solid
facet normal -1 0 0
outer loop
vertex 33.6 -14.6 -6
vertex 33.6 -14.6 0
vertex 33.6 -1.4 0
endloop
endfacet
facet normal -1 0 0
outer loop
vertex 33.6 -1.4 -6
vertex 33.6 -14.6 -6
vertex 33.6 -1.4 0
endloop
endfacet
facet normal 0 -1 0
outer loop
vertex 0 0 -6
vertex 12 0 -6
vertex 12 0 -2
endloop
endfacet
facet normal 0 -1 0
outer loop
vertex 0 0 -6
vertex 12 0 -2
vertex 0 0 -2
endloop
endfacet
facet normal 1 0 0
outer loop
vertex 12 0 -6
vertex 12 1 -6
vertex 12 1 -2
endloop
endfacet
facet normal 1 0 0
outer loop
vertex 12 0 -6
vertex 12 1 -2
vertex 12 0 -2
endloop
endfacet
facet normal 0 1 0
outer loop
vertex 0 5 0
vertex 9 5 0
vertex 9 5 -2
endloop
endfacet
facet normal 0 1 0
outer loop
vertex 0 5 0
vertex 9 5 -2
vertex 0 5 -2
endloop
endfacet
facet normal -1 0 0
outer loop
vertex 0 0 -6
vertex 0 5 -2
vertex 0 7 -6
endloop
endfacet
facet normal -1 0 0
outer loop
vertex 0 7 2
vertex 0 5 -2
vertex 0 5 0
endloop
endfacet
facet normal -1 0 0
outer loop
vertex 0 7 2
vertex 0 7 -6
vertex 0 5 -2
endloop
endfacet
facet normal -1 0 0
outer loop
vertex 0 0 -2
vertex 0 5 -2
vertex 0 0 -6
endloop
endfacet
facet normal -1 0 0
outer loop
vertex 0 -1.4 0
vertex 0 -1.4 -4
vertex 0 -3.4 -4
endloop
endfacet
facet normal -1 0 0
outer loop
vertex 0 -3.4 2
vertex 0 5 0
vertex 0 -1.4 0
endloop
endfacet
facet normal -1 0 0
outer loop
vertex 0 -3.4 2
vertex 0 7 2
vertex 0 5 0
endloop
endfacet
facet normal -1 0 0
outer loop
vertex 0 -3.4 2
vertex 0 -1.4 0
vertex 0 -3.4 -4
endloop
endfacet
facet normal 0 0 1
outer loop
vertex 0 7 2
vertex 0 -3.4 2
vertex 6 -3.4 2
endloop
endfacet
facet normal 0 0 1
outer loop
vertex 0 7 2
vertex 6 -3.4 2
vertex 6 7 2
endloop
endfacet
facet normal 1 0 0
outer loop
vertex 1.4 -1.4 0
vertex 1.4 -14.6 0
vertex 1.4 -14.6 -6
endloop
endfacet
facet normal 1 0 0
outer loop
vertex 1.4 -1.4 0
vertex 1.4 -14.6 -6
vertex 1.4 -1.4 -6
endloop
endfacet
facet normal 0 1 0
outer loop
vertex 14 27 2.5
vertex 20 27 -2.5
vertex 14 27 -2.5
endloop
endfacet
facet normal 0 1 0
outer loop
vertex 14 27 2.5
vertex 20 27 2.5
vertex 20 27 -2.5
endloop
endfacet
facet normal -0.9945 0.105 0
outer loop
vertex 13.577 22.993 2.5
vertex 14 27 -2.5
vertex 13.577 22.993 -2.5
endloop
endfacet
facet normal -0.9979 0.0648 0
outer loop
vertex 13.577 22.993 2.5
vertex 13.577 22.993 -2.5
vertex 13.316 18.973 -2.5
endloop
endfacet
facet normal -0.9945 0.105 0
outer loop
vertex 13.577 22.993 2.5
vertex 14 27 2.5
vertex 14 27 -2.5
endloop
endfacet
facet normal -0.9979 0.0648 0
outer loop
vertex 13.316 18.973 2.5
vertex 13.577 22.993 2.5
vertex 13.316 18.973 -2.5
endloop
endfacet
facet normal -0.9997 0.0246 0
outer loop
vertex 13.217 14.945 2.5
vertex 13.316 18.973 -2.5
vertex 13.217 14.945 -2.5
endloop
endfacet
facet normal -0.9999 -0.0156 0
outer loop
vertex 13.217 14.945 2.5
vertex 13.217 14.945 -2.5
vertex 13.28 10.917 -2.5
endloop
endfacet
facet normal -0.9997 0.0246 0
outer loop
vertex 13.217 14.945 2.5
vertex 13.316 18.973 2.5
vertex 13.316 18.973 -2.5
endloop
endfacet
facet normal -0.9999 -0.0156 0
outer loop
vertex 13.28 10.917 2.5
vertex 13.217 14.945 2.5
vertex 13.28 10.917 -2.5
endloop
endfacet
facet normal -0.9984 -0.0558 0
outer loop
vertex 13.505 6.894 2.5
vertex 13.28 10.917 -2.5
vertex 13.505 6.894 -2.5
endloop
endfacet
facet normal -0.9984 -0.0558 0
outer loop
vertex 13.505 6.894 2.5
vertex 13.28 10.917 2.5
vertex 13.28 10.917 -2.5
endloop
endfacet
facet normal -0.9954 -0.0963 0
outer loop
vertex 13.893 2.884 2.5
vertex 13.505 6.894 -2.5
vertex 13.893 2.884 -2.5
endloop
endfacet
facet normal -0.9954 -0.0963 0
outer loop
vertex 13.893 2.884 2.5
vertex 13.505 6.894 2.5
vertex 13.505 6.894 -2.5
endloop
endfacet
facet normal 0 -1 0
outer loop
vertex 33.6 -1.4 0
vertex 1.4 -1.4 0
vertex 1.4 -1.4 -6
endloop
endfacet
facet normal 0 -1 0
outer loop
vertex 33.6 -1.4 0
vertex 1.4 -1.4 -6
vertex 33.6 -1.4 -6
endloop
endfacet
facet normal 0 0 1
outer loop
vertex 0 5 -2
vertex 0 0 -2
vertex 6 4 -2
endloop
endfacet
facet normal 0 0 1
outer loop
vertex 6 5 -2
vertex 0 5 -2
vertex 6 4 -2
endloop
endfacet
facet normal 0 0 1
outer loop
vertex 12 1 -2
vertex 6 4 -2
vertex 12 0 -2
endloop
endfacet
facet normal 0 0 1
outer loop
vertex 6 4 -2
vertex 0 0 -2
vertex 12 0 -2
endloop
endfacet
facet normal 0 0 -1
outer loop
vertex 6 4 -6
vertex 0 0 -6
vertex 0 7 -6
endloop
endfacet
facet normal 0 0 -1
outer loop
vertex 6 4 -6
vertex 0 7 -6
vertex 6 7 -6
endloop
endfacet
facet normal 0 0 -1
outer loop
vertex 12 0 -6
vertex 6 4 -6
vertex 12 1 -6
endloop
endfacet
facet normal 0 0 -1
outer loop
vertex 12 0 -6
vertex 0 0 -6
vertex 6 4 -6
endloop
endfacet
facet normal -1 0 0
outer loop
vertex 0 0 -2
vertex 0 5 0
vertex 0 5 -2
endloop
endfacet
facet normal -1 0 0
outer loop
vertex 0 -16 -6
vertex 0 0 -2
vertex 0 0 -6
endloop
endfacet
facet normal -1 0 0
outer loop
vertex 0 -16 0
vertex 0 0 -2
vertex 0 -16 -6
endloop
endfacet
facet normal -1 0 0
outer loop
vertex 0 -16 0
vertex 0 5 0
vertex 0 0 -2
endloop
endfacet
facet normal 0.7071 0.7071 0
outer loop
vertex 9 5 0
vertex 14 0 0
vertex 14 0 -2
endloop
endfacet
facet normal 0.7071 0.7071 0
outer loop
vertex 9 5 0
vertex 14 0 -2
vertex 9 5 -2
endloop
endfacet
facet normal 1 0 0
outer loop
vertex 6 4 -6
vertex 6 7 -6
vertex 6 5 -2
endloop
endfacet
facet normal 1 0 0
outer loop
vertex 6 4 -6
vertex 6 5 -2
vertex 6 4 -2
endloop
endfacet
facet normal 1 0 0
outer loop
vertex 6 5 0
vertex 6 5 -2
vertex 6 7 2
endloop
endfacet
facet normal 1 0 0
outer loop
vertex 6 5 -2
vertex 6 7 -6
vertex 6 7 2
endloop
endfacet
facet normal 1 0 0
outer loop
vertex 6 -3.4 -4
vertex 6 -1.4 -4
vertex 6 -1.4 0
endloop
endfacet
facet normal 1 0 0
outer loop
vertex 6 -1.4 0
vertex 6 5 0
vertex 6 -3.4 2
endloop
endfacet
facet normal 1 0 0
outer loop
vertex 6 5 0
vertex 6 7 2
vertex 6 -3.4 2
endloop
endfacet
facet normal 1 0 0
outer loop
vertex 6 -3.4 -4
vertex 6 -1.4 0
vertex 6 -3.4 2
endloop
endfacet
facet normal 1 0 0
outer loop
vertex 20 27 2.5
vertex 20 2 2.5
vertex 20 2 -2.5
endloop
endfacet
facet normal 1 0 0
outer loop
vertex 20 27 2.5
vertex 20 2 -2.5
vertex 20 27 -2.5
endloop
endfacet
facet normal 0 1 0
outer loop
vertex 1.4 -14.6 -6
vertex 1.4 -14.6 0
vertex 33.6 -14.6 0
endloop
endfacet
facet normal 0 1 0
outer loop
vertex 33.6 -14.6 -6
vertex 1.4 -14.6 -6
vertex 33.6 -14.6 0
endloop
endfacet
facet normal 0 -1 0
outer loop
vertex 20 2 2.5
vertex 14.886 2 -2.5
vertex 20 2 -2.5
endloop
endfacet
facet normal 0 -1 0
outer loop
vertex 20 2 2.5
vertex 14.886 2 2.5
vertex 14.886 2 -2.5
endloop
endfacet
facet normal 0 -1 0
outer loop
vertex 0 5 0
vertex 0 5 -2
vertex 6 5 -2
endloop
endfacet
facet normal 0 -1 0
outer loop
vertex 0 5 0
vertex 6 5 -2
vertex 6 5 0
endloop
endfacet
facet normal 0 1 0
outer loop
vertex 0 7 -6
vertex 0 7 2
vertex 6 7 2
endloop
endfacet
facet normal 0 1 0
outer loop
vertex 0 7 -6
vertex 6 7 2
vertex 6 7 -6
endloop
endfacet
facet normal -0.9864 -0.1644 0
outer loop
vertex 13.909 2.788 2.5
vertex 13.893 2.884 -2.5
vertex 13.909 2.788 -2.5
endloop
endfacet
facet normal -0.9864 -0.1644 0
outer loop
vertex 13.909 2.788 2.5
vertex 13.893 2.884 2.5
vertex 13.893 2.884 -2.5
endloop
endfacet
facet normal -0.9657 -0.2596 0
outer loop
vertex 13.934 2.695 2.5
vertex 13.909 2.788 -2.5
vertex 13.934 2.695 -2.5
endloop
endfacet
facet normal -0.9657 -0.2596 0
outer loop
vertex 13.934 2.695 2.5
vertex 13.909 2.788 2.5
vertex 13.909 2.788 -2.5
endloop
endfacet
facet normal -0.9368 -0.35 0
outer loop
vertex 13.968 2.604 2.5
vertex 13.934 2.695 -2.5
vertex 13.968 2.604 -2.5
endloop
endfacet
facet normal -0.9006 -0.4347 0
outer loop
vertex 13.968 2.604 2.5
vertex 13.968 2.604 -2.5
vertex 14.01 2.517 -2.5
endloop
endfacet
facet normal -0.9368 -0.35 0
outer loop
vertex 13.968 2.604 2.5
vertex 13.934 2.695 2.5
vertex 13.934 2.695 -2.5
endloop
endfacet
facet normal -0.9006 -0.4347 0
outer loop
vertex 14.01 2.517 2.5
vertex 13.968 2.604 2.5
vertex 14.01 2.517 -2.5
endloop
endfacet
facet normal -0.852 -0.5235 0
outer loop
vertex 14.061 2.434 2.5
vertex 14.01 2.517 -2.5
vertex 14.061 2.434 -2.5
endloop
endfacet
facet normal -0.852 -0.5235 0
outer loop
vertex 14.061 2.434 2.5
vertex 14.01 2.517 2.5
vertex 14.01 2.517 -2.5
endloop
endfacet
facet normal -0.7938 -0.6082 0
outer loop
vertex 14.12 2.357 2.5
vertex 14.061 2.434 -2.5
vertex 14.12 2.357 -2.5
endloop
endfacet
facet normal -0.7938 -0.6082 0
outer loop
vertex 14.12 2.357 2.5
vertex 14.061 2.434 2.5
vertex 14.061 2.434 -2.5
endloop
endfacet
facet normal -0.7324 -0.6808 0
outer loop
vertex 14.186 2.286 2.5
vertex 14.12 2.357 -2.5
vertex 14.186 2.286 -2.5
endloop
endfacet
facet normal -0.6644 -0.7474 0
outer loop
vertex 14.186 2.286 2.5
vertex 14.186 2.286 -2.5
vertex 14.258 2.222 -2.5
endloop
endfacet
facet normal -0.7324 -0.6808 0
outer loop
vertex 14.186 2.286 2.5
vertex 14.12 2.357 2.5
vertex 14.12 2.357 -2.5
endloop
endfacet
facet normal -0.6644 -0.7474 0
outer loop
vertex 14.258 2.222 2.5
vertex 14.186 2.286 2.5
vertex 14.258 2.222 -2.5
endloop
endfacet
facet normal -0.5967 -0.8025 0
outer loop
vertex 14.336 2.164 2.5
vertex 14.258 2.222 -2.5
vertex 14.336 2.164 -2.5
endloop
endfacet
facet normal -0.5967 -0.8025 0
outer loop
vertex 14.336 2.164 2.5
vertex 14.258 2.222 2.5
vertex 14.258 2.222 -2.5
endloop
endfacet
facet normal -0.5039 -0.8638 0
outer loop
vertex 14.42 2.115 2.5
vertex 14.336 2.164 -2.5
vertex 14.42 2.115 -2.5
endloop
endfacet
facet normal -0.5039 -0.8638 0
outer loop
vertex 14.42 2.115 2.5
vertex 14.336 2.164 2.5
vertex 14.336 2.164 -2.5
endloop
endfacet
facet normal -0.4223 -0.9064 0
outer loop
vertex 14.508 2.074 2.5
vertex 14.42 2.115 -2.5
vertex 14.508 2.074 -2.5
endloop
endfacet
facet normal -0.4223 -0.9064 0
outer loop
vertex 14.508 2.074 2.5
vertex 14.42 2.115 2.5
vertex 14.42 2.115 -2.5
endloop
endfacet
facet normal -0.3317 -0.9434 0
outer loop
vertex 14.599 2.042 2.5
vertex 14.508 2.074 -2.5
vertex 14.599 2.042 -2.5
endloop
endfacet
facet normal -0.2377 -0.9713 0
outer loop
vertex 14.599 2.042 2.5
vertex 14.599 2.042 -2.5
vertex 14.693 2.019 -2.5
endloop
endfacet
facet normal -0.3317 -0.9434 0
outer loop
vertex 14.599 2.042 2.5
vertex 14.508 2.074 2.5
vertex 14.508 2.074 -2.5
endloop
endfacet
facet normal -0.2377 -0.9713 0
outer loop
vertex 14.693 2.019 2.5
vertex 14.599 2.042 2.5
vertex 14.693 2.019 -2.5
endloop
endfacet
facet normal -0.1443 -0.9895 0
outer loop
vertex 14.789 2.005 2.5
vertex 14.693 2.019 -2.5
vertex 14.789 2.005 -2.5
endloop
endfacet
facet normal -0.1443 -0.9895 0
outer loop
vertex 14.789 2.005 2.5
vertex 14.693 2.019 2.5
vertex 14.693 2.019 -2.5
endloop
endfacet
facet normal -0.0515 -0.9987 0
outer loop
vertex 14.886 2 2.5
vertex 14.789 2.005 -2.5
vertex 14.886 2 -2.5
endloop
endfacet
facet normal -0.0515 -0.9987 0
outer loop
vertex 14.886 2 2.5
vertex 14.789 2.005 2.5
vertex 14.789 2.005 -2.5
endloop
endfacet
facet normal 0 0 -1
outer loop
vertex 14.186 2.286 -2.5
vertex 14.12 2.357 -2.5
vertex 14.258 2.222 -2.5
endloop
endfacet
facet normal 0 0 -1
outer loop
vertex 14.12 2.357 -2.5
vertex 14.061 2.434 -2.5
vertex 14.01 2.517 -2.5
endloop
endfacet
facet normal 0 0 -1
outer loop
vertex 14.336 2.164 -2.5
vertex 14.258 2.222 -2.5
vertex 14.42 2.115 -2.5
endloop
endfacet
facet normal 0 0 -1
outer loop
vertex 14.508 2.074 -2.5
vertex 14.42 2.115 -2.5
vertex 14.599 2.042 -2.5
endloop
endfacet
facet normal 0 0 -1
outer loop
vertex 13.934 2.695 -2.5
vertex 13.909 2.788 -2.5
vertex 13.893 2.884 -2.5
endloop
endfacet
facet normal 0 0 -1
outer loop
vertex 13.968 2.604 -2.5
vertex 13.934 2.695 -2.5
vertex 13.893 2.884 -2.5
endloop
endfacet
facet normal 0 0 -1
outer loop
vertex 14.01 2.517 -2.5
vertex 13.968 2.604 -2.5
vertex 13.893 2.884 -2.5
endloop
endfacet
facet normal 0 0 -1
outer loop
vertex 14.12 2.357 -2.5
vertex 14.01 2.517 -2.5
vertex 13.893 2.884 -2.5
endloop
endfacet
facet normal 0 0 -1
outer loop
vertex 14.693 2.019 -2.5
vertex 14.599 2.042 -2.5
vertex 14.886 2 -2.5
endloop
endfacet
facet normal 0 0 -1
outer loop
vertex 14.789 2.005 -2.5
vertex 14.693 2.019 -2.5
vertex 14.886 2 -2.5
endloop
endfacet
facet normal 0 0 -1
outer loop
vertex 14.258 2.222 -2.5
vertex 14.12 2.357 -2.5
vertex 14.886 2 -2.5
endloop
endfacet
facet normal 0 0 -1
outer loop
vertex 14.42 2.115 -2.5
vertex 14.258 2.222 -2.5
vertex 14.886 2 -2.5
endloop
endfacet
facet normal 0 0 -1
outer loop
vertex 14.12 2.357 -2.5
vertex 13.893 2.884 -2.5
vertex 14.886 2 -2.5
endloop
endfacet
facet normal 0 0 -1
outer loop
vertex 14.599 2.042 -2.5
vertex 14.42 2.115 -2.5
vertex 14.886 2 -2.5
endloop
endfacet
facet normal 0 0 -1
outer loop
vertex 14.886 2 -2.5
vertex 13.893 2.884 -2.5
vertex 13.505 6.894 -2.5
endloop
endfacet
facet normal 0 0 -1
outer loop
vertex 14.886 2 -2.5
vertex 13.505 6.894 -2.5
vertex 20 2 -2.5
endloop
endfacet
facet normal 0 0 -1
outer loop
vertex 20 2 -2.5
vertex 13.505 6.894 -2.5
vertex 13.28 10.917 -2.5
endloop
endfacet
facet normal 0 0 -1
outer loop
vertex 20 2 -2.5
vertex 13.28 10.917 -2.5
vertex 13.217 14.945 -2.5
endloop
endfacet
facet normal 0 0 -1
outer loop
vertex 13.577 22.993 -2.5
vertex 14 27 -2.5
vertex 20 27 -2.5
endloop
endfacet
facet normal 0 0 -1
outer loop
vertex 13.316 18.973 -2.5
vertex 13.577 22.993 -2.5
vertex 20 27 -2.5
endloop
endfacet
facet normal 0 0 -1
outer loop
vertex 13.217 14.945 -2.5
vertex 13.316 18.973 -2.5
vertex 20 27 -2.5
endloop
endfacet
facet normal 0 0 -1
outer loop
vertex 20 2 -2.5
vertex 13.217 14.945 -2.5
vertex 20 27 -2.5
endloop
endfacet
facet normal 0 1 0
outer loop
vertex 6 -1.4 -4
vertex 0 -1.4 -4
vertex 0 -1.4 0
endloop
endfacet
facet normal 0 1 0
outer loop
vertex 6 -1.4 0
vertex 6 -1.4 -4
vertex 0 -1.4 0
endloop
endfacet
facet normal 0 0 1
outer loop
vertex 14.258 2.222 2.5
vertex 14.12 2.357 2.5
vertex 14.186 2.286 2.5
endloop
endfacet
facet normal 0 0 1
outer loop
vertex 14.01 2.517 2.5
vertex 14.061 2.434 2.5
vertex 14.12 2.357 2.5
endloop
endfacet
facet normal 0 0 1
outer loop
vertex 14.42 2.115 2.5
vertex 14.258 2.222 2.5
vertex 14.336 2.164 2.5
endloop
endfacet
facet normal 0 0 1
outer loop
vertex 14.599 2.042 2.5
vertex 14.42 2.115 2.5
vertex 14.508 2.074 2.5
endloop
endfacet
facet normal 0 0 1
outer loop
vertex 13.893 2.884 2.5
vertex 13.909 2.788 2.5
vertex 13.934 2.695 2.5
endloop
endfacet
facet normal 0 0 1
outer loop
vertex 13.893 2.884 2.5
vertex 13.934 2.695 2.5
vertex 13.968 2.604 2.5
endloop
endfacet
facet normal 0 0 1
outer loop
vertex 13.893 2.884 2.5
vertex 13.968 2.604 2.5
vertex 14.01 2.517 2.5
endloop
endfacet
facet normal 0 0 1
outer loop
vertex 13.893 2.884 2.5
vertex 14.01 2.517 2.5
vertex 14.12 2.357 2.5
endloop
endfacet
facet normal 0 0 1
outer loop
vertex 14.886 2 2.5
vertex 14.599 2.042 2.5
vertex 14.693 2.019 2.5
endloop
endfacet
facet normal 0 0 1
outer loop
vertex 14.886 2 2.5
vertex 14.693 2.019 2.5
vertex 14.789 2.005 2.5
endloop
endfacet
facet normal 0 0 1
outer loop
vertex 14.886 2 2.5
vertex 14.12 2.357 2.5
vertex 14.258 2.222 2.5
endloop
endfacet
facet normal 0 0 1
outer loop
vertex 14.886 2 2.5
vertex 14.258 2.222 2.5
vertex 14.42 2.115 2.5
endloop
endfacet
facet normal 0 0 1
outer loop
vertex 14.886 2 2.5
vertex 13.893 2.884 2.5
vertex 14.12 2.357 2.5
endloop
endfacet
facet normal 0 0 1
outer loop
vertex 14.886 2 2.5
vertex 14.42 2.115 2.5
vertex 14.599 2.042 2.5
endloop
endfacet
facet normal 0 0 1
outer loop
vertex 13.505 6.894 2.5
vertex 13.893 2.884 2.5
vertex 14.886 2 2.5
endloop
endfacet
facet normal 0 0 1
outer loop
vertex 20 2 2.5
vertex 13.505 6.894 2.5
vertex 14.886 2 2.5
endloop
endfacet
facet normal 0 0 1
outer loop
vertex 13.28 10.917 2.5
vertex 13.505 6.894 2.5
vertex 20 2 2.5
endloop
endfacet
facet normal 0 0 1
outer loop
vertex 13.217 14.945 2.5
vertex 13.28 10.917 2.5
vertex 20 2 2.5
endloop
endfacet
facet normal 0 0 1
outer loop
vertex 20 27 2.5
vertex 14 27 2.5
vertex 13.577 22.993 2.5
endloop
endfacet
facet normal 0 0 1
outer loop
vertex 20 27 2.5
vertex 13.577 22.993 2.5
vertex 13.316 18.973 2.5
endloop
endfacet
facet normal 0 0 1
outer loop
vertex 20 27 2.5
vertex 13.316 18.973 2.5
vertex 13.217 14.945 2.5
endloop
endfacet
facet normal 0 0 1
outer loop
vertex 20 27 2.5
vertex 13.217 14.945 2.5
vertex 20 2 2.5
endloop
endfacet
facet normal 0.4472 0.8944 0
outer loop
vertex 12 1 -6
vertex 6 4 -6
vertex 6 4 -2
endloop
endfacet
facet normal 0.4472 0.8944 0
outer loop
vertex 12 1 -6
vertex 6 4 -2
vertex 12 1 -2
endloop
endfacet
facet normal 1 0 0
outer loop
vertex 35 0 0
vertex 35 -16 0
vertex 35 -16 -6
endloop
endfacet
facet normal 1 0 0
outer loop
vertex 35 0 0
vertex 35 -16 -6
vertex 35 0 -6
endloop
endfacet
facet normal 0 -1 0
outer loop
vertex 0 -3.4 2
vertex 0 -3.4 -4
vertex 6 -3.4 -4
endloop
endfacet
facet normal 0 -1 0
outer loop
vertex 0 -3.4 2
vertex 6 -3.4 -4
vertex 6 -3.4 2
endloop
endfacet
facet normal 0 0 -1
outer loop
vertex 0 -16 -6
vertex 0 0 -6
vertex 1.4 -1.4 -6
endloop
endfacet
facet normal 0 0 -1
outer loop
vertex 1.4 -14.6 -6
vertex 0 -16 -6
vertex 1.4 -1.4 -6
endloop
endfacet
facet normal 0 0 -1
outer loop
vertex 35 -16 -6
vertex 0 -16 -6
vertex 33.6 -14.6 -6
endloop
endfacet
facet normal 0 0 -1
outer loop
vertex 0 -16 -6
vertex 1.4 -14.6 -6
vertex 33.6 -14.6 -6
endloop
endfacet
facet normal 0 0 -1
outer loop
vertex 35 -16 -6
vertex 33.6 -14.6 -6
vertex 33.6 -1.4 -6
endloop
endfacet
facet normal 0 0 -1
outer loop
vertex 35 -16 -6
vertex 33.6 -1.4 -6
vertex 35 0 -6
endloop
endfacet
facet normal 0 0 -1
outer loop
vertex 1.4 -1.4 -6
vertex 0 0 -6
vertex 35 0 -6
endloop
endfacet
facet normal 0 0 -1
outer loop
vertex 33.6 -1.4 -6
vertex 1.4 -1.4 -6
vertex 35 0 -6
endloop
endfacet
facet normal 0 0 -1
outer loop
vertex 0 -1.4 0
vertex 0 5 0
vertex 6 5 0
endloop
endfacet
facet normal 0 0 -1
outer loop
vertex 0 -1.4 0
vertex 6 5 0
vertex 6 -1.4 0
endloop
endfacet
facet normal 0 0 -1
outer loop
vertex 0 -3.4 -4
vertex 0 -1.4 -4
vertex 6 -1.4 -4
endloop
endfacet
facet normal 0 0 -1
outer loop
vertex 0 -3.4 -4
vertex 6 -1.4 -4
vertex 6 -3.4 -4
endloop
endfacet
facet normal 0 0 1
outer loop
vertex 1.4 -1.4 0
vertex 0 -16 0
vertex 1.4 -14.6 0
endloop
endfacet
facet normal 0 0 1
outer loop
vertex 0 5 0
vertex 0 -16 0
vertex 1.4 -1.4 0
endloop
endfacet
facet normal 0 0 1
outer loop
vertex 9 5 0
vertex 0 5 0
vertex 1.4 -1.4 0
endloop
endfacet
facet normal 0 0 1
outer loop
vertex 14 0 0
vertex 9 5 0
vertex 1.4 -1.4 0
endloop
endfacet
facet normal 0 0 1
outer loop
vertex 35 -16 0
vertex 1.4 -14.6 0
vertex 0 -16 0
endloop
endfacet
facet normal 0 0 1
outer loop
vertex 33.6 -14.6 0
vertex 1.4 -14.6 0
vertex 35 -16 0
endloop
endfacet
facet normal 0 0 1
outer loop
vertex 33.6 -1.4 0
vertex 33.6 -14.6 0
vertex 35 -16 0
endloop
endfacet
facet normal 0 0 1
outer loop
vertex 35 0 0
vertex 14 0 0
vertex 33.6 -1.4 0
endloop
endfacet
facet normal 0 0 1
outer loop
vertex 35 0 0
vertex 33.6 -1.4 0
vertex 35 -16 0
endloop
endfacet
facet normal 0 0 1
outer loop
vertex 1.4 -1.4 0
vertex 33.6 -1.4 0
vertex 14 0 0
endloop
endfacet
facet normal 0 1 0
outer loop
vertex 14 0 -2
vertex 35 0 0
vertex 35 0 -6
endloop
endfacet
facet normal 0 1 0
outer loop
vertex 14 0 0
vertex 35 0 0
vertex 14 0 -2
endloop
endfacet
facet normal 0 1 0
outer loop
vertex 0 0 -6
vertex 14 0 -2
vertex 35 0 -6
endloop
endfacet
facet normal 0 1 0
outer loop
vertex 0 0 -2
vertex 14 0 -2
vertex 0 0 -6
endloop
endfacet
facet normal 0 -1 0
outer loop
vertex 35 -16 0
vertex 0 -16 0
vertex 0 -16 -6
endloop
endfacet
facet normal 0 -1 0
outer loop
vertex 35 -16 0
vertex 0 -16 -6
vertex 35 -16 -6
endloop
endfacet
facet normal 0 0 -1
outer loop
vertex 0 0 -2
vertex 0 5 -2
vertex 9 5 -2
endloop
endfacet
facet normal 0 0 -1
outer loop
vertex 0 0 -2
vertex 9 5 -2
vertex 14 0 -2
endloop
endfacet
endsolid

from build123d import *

# Parameters (mm, degrees)
F0_W     = 32.2000000998
F0_H     = 13.2000000998
F1_DEPTH = 6
F2_DEPTH = 2
F3_W     = 2
F3_H     = 4
F4_DEPTH = 6
F6_DEPTH = 4
F8_DEPTH = 2.5
F9_R     = 1


with BuildPart() as f1:
    # F0 (on Top) → F1 (new body)
    with BuildSketch(Plane.XY):
        Polygon((35, 0), (14, 0), (0, 0), (0, -16), (35, -16), align=None)
        with Locations((17.5, -8)):
            Rectangle(F0_W, F0_H, mode=Mode.SUBTRACT)
    extrude(amount=-F1_DEPTH)

    # F0 (on Top) → F2 (join)
    with BuildSketch(Plane.XY):
        Polygon((0, 0), (14, 0), (9, 5), (0, 5), align=None)
    extrude(amount=-F2_DEPTH)


with BuildPart() as f4:
    # F3 (on face) → F4 (new body)
    with BuildSketch(Plane(origin=(0, 0, 0), x_dir=(0, -1, 0), z_dir=(-1, 0, 0))):
        Polygon((-5, 0), (0, 0), (1.3999999501, 0), (3.3999999501, 0), (3.3999999501, 2), (0, 2), (-7, 2), (-7, -6), (0, -6), (0, -2), (-5, -2), align=None)
        with Locations((2.3999999501, -2)):
            Rectangle(F3_W, F3_H)
    extrude(amount=-F4_DEPTH)

    # F5 (on face) → F6 (join, through all)
    with BuildSketch(Plane(origin=(0, 0, -6), x_dir=(1, 0, 0), z_dir=(0, 0, -1))):
        Polygon((12, 0), (6, 0), (6, -4), (12, -1), align=None)
    extrude(amount=-F6_DEPTH)


with BuildPart() as f8:
    # F7 (on face) → F8 (new body, symmetric)
    with BuildSketch(Plane.XY):
        with BuildLine():
            ThreePointArc((14, 27), (13.2156741649, 14.5), (14, 2))
            Line((14, 2), (20, 2))
            Line((20, 2), (20, 27))
            Line((20, 27), (14, 27))
        make_face()
    extrude(amount=F8_DEPTH, both=True)

    # F9
    f9_edges = [f8.edges().sort_by_distance(p)[0] for p in [
        (14, 2, 0),
    ]]
    fillet(f9_edges, radius=F9_R)


solid = Compound([f1.part, f4.part, f8.part])
